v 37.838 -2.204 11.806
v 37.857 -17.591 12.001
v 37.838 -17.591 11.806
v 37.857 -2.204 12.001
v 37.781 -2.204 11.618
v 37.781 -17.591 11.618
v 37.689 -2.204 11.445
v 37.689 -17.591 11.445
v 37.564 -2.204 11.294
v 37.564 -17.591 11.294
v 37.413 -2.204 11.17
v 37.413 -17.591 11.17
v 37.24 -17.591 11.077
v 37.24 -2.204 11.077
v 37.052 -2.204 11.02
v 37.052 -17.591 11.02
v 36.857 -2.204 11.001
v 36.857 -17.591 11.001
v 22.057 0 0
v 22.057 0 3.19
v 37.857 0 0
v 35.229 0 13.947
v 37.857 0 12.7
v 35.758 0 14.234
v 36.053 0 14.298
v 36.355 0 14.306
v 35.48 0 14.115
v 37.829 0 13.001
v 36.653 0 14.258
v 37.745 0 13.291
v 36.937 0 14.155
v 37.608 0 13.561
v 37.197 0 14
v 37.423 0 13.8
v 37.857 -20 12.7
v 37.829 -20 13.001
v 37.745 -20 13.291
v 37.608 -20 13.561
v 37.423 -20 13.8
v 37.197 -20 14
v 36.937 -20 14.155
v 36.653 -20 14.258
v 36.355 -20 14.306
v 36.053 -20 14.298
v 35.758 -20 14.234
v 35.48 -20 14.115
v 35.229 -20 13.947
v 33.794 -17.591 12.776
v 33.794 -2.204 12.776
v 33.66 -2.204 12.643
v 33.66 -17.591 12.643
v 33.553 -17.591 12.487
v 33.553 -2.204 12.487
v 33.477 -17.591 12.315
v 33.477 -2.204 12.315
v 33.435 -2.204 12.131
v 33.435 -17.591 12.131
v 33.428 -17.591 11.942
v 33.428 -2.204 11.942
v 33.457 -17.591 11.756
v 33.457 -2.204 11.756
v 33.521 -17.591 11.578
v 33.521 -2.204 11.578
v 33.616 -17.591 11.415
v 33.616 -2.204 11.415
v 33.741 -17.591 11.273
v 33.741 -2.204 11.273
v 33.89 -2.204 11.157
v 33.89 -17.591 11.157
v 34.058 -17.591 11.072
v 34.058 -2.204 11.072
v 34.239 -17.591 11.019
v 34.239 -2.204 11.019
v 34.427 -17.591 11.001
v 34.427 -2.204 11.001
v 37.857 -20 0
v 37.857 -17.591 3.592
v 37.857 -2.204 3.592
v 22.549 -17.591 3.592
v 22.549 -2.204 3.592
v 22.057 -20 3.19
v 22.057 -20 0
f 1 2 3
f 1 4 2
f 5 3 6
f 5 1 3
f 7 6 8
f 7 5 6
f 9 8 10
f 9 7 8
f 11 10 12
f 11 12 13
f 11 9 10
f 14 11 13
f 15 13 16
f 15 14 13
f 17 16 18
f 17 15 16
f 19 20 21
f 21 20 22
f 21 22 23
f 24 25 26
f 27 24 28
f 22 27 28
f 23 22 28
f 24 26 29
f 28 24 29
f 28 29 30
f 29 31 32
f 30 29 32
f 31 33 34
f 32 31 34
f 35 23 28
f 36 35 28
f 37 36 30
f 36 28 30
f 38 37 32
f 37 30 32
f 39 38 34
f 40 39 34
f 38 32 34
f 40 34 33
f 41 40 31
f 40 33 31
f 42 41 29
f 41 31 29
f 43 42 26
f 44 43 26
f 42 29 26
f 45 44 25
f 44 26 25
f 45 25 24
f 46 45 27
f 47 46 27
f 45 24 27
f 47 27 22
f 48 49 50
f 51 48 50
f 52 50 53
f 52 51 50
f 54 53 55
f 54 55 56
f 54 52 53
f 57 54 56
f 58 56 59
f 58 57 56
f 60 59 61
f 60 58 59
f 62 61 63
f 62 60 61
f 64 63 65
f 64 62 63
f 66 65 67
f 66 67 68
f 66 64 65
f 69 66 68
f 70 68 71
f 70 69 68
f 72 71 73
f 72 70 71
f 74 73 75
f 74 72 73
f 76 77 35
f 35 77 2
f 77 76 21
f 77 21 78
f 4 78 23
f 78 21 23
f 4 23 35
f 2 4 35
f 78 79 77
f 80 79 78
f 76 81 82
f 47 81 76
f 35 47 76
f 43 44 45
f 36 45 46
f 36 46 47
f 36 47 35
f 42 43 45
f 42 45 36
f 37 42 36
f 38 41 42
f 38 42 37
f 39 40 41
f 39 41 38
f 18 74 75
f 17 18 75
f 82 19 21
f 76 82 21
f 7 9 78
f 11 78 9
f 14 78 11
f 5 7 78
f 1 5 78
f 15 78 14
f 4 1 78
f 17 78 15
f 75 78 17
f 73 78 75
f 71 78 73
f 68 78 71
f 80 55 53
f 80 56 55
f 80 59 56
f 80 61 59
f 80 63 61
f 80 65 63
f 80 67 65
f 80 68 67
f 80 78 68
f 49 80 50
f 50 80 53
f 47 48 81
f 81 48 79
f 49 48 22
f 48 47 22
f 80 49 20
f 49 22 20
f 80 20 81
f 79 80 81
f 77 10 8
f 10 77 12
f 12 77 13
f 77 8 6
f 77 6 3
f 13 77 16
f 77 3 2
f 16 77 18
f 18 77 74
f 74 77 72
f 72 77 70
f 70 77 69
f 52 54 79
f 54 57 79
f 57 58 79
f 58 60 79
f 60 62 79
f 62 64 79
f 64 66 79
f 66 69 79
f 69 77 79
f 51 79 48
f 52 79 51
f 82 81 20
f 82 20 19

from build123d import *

# Parameters (mm, degrees)
F1_DEPTH = 20
F2_DEPTH = 20
F3_W     = 15.387754
F3_H     = 7.40892
F4_DEPTH = 50
F5_R     = 1
F6_R     = 1


with BuildPart() as f1:
    # F0 (on Front) → F1 (new body)
    with BuildSketch(Plane.XZ):
        with BuildLine():
            ThreePointArc((35.22866, 13.946989), (35.556946, 11.245402), (37.857051, 12.7))
            ThreePointArc((37.857051, 12.7), (36.937157, 14.154598), (35.22866, 13.946989))
        make_face()
    extrude(amount=F1_DEPTH)

    # F0 (on Front) → F2 (join)
    with BuildSketch(Plane.XZ):
        with BuildLine():
            Line((22.057051, 3.19), (22.057051, 0))
            Line((22.057051, 0), (37.857051, 0))
            Line((37.857051, 0), (37.857051, 12.7))
            ThreePointArc((37.857051, 12.7), (35.556946, 11.245402), (35.22866, 13.946989))
            Line((35.22866, 13.946989), (22.057051, 3.19))
        make_face()
        with BuildLine():
            ThreePointArc((35.22866, 13.946989), (35.556946, 11.245402), (37.857051, 12.7))
            ThreePointArc((37.857051, 12.7), (36.937157, 14.154598), (35.22866, 13.946989))
        make_face()
    extrude(amount=F2_DEPTH)

    # F3 (on Right) → F4 (cut)
    with BuildSketch(Plane.YZ):
        with Locations((-9.89757, 7.296514)):
            Rectangle(F3_W, F3_H)
    extrude(amount=F4_DEPTH, mode=Mode.SUBTRACT)

    # F5
    f5_edges = [f1.edges().sort_by_distance(p)[0] for p in [
        (31.621354, -9.89757, 11.000974),
    ]]
    fillet(f5_edges, radius=F5_R)

    # F6
    f6_edges = [f1.edges().sort_by_distance(p)[0] for p in [
        (37.857051, -9.89757, 11.000974),
    ]]
    fillet(f6_edges, radius=F6_R)


solid = f1.part
